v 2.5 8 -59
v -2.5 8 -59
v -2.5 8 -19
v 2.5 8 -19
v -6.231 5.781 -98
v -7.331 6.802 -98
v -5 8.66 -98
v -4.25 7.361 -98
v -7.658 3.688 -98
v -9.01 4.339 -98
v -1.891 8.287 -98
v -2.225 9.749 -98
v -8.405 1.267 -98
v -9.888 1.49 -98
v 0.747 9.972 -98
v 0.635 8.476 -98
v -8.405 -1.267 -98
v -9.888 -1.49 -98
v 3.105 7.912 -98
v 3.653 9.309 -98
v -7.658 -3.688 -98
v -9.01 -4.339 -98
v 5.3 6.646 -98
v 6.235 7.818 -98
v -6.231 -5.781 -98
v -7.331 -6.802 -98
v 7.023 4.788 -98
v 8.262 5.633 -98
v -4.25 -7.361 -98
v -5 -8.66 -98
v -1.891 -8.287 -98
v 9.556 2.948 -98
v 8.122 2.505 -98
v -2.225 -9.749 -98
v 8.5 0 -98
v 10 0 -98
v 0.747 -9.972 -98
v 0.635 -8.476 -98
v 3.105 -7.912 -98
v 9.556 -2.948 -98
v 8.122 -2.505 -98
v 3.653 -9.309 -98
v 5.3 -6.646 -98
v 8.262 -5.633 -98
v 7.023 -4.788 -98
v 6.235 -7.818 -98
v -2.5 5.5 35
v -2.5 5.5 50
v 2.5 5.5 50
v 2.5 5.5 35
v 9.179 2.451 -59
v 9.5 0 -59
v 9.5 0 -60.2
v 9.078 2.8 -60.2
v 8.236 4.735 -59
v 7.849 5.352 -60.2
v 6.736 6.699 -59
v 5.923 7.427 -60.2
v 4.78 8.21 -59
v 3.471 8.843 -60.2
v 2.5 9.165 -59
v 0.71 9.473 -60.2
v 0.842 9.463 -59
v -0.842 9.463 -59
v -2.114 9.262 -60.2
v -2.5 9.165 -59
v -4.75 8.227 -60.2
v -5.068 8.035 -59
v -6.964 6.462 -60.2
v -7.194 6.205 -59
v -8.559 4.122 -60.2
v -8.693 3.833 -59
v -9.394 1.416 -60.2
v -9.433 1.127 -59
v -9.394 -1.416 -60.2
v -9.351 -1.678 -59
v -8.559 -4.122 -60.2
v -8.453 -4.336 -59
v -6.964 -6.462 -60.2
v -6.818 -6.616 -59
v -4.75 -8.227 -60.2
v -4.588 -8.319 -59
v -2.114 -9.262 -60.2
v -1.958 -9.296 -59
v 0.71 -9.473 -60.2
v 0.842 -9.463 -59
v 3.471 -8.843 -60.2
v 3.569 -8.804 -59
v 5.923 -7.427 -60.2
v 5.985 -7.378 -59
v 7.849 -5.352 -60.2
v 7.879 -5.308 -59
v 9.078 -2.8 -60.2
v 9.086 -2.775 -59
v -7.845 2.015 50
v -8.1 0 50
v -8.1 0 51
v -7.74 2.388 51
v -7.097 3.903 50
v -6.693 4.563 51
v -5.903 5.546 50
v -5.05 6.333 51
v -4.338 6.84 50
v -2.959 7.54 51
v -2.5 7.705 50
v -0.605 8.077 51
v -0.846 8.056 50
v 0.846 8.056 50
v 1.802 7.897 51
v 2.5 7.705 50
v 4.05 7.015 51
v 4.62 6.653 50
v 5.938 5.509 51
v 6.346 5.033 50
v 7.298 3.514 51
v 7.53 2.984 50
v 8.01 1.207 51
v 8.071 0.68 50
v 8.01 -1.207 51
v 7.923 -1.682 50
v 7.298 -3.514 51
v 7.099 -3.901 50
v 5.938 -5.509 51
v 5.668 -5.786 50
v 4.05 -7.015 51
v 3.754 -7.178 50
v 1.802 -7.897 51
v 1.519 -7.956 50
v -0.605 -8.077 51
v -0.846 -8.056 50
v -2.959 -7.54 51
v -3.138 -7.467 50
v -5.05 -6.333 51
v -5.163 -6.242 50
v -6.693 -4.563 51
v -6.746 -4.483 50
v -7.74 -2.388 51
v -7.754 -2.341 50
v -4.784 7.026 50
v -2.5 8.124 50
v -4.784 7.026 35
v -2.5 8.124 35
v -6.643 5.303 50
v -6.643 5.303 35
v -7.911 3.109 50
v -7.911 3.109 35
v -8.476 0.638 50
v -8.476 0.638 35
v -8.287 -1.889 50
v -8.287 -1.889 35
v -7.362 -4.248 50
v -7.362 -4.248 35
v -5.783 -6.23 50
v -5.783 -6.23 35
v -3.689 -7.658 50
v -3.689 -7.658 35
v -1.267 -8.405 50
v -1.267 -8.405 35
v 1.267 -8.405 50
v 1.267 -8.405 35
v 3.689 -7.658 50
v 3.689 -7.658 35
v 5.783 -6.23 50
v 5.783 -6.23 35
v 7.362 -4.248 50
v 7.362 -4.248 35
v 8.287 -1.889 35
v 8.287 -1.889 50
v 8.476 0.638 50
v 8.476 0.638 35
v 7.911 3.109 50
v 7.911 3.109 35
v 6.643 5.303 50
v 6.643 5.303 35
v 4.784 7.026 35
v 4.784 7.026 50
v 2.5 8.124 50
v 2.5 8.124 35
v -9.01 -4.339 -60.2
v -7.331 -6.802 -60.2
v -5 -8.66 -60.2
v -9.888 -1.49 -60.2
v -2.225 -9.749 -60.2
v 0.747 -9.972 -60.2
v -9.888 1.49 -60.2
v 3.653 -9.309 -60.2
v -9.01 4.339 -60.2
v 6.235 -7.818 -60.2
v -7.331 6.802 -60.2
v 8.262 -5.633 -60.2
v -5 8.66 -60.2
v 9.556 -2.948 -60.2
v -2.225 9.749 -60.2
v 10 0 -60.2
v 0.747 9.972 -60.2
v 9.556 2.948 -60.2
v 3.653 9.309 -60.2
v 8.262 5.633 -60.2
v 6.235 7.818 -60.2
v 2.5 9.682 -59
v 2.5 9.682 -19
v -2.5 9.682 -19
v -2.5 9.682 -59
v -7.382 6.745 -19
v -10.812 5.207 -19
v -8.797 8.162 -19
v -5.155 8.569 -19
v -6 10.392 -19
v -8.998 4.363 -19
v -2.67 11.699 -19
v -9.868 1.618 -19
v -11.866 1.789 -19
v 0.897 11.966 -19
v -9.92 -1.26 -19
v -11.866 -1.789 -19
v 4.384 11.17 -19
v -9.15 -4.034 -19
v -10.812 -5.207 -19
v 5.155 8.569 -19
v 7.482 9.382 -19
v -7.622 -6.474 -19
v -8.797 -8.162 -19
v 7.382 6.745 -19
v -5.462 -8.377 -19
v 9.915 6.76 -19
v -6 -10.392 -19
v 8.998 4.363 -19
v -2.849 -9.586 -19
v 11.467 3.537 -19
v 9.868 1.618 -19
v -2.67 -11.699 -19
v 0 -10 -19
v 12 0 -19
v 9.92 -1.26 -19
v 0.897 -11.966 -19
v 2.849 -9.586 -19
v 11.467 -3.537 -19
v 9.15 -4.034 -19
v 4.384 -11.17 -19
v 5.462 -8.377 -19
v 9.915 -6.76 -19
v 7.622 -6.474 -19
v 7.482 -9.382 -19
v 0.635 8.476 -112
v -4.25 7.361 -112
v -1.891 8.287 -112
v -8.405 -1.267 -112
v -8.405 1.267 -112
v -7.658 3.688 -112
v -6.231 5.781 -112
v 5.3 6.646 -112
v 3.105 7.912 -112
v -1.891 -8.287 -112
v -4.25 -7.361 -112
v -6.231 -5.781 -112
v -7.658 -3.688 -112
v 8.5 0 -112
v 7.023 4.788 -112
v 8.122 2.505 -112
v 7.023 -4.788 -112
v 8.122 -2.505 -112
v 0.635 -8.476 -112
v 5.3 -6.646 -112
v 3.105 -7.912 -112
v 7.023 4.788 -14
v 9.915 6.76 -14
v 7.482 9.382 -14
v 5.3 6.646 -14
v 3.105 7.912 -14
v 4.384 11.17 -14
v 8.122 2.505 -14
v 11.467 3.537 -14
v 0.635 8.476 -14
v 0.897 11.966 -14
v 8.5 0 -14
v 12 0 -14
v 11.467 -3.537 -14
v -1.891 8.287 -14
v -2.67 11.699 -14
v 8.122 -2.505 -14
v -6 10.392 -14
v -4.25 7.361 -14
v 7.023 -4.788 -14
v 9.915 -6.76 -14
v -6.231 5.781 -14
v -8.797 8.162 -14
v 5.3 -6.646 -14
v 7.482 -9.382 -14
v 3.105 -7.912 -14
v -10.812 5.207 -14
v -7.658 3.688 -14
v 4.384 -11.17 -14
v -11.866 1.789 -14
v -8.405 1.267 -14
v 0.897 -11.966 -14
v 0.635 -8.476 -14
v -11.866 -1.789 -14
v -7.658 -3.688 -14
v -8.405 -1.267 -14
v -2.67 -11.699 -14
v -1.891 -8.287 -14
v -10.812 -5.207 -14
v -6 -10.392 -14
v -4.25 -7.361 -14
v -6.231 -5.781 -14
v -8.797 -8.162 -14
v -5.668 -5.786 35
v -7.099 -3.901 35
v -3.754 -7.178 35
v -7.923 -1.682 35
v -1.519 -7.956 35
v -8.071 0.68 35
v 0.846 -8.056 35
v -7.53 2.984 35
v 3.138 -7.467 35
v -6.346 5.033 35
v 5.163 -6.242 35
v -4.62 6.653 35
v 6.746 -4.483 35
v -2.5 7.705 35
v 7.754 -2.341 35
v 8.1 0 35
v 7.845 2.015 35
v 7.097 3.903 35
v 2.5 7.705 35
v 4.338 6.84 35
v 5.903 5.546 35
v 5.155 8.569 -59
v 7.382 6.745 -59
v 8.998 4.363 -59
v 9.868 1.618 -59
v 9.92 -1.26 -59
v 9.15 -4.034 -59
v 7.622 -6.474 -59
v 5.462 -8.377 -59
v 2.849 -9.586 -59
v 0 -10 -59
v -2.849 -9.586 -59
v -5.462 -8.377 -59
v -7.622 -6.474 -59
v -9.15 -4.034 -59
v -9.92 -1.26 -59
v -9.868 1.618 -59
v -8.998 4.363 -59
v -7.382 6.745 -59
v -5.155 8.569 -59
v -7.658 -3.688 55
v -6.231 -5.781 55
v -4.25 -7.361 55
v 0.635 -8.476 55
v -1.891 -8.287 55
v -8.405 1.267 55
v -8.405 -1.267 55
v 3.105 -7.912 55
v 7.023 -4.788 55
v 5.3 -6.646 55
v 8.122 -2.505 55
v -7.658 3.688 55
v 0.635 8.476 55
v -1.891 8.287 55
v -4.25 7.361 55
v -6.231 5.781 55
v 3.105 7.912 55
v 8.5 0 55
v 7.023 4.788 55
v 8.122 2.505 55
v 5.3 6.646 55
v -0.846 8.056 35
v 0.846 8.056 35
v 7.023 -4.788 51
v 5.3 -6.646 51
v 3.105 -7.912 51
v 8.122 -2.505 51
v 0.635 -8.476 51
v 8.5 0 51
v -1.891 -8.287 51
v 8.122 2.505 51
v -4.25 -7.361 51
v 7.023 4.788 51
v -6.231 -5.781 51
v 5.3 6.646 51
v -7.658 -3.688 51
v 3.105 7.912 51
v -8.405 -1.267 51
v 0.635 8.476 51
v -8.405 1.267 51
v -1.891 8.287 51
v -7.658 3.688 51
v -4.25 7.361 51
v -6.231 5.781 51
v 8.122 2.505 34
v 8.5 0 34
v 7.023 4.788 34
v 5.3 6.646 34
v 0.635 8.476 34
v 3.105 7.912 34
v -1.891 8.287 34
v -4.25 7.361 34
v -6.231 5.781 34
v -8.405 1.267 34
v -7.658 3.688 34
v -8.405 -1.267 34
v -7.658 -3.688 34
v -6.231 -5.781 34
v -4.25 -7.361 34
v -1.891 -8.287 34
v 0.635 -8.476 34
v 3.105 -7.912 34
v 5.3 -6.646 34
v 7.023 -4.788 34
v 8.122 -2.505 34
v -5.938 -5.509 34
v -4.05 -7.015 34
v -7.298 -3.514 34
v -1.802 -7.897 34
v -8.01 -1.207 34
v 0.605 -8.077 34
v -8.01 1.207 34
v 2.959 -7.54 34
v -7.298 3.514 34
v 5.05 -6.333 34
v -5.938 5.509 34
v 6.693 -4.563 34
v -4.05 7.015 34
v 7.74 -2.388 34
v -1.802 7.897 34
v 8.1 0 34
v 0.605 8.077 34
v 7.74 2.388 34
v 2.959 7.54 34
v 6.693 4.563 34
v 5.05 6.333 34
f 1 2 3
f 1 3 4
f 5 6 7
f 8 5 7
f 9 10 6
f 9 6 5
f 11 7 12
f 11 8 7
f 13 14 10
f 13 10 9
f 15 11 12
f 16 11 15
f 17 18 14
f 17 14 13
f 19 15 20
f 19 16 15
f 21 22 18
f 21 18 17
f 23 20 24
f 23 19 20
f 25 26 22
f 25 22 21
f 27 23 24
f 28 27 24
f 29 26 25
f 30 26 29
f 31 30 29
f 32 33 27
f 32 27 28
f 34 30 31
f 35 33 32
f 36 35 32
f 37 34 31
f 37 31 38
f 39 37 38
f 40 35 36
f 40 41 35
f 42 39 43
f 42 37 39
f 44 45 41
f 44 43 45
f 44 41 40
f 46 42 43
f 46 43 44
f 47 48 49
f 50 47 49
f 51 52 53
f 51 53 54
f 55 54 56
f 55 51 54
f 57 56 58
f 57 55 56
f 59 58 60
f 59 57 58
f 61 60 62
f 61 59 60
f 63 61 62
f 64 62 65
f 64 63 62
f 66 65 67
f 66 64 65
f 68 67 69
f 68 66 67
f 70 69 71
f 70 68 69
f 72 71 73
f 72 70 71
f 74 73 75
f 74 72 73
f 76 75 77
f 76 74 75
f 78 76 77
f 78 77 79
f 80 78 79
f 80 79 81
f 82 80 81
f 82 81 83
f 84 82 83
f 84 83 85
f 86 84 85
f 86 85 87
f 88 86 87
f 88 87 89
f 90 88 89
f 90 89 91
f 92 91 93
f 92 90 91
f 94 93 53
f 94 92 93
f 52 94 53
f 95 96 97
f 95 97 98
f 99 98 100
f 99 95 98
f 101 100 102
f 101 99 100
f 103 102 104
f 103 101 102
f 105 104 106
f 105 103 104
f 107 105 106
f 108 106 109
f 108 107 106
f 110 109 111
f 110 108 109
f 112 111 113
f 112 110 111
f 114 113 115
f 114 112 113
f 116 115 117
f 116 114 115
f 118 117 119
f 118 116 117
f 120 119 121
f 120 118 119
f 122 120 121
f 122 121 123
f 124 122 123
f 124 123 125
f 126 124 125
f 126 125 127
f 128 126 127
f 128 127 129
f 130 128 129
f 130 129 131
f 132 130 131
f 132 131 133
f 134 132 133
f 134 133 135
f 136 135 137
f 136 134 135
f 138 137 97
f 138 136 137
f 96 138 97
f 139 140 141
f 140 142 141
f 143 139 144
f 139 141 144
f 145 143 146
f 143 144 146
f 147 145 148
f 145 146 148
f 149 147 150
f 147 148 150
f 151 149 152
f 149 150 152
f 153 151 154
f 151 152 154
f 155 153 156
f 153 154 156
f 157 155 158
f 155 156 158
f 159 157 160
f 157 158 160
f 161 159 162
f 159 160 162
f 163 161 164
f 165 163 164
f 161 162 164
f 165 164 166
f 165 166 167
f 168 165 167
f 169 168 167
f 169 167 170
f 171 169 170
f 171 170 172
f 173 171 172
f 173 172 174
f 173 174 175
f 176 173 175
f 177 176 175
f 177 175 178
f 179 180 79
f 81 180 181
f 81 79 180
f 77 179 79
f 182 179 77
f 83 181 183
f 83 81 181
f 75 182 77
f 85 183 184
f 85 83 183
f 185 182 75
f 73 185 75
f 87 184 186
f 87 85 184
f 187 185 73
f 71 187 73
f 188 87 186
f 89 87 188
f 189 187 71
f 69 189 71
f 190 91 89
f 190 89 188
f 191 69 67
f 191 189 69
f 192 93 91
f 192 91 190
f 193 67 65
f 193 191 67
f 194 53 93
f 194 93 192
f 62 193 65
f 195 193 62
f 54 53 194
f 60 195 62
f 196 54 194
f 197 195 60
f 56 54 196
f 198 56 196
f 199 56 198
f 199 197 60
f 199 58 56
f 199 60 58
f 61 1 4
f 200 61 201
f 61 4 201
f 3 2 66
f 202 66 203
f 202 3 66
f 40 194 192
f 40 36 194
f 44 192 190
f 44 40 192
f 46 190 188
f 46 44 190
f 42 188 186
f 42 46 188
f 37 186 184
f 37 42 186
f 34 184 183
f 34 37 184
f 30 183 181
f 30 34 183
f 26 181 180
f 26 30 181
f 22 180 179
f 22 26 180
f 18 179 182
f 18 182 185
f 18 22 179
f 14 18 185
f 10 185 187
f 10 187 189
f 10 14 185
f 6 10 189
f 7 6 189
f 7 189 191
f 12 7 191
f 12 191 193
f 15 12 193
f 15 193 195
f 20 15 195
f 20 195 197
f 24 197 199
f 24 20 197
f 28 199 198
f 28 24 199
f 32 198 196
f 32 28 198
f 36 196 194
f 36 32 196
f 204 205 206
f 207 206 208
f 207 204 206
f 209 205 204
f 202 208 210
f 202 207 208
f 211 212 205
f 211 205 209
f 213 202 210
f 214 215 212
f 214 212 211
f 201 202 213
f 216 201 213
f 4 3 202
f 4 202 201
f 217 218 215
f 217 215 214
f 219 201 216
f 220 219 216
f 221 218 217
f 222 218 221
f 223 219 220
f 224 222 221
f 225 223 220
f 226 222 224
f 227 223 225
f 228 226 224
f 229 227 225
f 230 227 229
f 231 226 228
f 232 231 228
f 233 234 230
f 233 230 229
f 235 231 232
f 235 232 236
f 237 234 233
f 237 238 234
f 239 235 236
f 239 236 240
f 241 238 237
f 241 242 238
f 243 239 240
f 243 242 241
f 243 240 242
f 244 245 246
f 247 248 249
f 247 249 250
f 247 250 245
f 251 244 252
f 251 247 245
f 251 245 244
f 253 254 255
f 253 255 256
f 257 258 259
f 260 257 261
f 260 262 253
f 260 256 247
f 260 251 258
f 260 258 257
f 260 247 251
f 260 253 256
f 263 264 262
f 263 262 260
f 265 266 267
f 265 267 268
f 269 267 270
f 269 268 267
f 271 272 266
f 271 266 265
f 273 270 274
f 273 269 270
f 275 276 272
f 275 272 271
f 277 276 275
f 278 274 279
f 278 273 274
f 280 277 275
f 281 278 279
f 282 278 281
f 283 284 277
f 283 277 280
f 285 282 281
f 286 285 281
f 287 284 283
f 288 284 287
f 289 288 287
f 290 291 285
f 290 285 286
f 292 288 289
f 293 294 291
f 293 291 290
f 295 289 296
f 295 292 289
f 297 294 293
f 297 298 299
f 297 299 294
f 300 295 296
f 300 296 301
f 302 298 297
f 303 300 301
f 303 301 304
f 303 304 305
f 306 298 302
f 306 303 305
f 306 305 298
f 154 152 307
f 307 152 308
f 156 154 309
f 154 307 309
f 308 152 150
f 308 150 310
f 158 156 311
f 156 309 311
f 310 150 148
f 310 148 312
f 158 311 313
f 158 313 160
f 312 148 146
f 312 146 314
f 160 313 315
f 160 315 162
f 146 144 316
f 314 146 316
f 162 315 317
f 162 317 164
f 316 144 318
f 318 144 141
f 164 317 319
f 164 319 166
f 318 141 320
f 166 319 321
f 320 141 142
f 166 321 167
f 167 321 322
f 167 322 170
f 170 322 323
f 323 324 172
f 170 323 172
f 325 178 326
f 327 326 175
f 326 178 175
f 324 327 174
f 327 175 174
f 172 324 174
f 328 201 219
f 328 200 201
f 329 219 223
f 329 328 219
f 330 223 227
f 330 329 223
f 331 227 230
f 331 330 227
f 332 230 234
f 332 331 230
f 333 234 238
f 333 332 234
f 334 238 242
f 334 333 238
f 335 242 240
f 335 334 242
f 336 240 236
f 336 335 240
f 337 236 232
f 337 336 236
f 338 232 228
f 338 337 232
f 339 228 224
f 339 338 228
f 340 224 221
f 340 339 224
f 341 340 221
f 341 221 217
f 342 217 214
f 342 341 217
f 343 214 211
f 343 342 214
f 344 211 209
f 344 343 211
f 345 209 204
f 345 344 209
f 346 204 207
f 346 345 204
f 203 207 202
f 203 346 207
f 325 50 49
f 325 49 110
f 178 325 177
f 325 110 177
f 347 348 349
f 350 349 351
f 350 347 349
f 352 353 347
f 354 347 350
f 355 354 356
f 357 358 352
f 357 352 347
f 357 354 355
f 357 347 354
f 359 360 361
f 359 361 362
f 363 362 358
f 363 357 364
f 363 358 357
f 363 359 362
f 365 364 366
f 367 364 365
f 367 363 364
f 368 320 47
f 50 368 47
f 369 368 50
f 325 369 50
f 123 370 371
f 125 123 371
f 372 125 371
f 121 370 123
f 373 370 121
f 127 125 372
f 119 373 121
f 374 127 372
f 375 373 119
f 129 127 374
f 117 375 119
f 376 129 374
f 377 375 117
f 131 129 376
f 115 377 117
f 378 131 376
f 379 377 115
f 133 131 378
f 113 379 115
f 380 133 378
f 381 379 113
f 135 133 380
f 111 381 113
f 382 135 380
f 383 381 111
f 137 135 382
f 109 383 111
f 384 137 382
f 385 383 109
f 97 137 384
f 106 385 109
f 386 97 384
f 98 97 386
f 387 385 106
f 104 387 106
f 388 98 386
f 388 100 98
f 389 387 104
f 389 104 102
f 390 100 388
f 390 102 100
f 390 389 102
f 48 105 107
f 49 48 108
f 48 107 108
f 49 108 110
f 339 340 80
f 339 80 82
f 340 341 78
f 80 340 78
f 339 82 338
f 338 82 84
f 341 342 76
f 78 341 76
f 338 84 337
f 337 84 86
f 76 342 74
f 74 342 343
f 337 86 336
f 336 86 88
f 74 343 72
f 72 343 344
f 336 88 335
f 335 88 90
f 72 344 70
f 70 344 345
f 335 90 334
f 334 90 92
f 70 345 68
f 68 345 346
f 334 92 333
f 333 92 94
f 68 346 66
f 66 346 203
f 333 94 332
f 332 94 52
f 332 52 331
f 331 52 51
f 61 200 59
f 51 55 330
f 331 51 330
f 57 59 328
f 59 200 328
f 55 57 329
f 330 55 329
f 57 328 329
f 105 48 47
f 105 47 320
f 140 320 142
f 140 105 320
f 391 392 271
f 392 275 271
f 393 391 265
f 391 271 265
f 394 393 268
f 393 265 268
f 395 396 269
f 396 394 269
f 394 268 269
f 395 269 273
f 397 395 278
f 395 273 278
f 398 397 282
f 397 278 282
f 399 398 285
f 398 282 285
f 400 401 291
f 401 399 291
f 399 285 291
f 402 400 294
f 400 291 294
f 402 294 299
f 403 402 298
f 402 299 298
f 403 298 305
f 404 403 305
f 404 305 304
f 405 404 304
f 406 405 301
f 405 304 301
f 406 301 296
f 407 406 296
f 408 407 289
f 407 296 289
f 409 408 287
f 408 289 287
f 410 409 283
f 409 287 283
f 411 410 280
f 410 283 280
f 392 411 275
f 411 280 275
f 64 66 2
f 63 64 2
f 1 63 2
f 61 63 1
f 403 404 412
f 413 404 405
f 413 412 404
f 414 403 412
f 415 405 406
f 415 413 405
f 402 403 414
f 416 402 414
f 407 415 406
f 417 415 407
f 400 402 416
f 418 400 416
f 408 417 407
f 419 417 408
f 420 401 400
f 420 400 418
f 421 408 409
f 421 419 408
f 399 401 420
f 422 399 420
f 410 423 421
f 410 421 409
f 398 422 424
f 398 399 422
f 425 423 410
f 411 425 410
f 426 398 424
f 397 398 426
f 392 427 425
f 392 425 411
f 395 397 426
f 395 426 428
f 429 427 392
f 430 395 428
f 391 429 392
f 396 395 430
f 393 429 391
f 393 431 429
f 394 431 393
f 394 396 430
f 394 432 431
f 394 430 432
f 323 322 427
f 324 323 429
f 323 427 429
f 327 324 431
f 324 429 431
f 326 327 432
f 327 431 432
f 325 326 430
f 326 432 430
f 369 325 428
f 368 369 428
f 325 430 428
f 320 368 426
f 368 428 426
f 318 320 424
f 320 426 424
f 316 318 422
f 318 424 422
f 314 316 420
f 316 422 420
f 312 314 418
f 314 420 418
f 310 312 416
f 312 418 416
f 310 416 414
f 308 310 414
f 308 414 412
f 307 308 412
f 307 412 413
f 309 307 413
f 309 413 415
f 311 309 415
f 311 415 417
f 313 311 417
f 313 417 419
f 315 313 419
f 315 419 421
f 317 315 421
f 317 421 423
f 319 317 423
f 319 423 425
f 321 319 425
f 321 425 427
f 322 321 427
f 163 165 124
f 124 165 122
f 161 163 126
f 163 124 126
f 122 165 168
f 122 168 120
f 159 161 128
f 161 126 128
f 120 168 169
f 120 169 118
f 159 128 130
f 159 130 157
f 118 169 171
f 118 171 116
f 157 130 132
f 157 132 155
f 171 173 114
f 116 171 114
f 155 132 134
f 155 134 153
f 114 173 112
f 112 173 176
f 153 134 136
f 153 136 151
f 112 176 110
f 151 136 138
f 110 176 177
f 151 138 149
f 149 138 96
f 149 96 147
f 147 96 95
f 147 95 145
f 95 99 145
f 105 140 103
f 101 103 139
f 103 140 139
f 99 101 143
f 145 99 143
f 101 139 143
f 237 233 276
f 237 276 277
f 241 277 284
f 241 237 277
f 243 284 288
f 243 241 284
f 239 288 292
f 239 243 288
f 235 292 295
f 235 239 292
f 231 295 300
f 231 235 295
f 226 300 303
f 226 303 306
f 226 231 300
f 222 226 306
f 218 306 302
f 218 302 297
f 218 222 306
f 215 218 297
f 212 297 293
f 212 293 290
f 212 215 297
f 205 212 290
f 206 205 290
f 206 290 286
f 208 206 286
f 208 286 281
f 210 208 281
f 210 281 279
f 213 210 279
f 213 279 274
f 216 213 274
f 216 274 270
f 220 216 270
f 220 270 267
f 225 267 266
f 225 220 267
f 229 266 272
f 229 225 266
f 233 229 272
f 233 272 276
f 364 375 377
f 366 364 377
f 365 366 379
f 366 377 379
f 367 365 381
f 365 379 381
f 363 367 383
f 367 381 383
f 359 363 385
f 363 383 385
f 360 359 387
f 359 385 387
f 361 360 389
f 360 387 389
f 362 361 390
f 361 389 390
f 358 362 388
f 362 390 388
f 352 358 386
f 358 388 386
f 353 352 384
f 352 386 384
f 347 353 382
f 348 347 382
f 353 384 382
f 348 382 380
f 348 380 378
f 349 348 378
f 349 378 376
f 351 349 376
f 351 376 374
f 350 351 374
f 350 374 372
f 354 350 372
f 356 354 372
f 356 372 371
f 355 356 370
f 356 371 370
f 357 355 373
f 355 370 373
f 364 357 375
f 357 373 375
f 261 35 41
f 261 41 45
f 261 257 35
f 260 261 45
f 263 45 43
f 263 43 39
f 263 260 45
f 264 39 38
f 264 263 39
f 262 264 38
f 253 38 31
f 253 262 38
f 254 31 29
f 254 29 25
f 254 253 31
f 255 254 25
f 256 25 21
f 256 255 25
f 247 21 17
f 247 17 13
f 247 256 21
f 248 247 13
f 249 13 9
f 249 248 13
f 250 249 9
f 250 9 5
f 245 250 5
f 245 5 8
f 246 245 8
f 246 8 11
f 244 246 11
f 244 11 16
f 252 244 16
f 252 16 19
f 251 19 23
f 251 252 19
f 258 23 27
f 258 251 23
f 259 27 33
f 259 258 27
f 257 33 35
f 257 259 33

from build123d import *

# Parameters (mm, degrees)
CUT_EXTRUDE1_START  = -19
SKETCH3_W           = 5
SKETCH3_H           = 8
CUT_EXTRUDE1_DEPTH  = 40
SKETCH4_R           = 12.5
SKETCH4_R_2         = 9.5
CUT_EXTRUDE2_DEPTH  = 1.2
SKETCH5_R           = 8.5
BOSS_EXTRUDE1_DEPTH = 50
SKETCH8_W           = 5
SKETCH8_H           = 3
CUT_EXTRUDE3_DEPTH  = 15
SKETCH9_R           = 8.5
BOSS_EXTRUDE2_DEPTH = 5
SKETCH10_R          = 10.1
SKETCH10_R_2        = 8.1
CUT_EXTRUDE4_DEPTH  = 1
CUT_EXTRUDE5_START  = -1
SKETCH11_R          = 10.1
SKETCH11_R_2        = 8.1
CUT_EXTRUDE5_DEPTH  = 1


with BuildPart() as part:
    # Sketch2 → Revolve1 (revolve)
    with BuildSketch(Plane(origin=(0, 0, 0), x_dir=(0, 0, -1), z_dir=(1, 0, 0)), mode=Mode.PRIVATE) as revolve1_sk:
        Polygon((0, 0), (0, 8.5), (14, 8.5), (14, 12), (19, 12), (19, 10), (98, 10), (98, 8.5), (112, 8.5), (112, 0), align=None)
    revolve(revolve1_sk.sketch.rotate(Axis((0, 0, 0), (0, 0, -1)), 90), axis=Axis((0, 0, 0), (0, 0, -1)))

    # Sketch3 → Cut-Extrude1 (cut)
    with BuildSketch(Plane.XY.offset(CUT_EXTRUDE1_START)):
        with Locations((0, 12)):
            Rectangle(SKETCH3_W, SKETCH3_H)
    extrude(amount=-CUT_EXTRUDE1_DEPTH, mode=Mode.SUBTRACT)

    # Sketch4 → Cut-Extrude2 (cut)
    with BuildSketch(Plane.XY.offset(-59)):
        Circle(SKETCH4_R)
        Circle(SKETCH4_R_2, mode=Mode.SUBTRACT)
    extrude(amount=-CUT_EXTRUDE2_DEPTH, mode=Mode.SUBTRACT)

    # Sketch5 → Boss-Extrude1 (add)
    with BuildSketch(Plane.XY):
        Circle(SKETCH5_R)
    extrude(amount=BOSS_EXTRUDE1_DEPTH)

    # Sketch8 → Cut-Extrude3 (cut)
    with BuildSketch(Plane.XY.offset(50)):
        with Locations((0, 7)):
            Rectangle(SKETCH8_W, SKETCH8_H)
    extrude(amount=-CUT_EXTRUDE3_DEPTH, mode=Mode.SUBTRACT)

    # Sketch9 → Boss-Extrude2 (add)
    with BuildSketch(Plane.XY.offset(50)):
        Circle(SKETCH9_R)
    extrude(amount=BOSS_EXTRUDE2_DEPTH)

    # Sketch10 → Cut-Extrude4 (cut)
    with BuildSketch(Plane(origin=(0, 0, 50), x_dir=(-1, 0, 0), z_dir=(0, 0, -1))):
        Circle(SKETCH10_R)
        Circle(SKETCH10_R_2, mode=Mode.SUBTRACT)
    extrude(amount=-CUT_EXTRUDE4_DEPTH, mode=Mode.SUBTRACT)

    # Sketch11 → Cut-Extrude5 (cut)
    with BuildSketch(Plane.XY.offset(35).offset(CUT_EXTRUDE5_START)):
        Circle(SKETCH11_R)
        Circle(SKETCH11_R_2, mode=Mode.SUBTRACT)
    extrude(amount=CUT_EXTRUDE5_DEPTH, mode=Mode.SUBTRACT)


solid = part.part
